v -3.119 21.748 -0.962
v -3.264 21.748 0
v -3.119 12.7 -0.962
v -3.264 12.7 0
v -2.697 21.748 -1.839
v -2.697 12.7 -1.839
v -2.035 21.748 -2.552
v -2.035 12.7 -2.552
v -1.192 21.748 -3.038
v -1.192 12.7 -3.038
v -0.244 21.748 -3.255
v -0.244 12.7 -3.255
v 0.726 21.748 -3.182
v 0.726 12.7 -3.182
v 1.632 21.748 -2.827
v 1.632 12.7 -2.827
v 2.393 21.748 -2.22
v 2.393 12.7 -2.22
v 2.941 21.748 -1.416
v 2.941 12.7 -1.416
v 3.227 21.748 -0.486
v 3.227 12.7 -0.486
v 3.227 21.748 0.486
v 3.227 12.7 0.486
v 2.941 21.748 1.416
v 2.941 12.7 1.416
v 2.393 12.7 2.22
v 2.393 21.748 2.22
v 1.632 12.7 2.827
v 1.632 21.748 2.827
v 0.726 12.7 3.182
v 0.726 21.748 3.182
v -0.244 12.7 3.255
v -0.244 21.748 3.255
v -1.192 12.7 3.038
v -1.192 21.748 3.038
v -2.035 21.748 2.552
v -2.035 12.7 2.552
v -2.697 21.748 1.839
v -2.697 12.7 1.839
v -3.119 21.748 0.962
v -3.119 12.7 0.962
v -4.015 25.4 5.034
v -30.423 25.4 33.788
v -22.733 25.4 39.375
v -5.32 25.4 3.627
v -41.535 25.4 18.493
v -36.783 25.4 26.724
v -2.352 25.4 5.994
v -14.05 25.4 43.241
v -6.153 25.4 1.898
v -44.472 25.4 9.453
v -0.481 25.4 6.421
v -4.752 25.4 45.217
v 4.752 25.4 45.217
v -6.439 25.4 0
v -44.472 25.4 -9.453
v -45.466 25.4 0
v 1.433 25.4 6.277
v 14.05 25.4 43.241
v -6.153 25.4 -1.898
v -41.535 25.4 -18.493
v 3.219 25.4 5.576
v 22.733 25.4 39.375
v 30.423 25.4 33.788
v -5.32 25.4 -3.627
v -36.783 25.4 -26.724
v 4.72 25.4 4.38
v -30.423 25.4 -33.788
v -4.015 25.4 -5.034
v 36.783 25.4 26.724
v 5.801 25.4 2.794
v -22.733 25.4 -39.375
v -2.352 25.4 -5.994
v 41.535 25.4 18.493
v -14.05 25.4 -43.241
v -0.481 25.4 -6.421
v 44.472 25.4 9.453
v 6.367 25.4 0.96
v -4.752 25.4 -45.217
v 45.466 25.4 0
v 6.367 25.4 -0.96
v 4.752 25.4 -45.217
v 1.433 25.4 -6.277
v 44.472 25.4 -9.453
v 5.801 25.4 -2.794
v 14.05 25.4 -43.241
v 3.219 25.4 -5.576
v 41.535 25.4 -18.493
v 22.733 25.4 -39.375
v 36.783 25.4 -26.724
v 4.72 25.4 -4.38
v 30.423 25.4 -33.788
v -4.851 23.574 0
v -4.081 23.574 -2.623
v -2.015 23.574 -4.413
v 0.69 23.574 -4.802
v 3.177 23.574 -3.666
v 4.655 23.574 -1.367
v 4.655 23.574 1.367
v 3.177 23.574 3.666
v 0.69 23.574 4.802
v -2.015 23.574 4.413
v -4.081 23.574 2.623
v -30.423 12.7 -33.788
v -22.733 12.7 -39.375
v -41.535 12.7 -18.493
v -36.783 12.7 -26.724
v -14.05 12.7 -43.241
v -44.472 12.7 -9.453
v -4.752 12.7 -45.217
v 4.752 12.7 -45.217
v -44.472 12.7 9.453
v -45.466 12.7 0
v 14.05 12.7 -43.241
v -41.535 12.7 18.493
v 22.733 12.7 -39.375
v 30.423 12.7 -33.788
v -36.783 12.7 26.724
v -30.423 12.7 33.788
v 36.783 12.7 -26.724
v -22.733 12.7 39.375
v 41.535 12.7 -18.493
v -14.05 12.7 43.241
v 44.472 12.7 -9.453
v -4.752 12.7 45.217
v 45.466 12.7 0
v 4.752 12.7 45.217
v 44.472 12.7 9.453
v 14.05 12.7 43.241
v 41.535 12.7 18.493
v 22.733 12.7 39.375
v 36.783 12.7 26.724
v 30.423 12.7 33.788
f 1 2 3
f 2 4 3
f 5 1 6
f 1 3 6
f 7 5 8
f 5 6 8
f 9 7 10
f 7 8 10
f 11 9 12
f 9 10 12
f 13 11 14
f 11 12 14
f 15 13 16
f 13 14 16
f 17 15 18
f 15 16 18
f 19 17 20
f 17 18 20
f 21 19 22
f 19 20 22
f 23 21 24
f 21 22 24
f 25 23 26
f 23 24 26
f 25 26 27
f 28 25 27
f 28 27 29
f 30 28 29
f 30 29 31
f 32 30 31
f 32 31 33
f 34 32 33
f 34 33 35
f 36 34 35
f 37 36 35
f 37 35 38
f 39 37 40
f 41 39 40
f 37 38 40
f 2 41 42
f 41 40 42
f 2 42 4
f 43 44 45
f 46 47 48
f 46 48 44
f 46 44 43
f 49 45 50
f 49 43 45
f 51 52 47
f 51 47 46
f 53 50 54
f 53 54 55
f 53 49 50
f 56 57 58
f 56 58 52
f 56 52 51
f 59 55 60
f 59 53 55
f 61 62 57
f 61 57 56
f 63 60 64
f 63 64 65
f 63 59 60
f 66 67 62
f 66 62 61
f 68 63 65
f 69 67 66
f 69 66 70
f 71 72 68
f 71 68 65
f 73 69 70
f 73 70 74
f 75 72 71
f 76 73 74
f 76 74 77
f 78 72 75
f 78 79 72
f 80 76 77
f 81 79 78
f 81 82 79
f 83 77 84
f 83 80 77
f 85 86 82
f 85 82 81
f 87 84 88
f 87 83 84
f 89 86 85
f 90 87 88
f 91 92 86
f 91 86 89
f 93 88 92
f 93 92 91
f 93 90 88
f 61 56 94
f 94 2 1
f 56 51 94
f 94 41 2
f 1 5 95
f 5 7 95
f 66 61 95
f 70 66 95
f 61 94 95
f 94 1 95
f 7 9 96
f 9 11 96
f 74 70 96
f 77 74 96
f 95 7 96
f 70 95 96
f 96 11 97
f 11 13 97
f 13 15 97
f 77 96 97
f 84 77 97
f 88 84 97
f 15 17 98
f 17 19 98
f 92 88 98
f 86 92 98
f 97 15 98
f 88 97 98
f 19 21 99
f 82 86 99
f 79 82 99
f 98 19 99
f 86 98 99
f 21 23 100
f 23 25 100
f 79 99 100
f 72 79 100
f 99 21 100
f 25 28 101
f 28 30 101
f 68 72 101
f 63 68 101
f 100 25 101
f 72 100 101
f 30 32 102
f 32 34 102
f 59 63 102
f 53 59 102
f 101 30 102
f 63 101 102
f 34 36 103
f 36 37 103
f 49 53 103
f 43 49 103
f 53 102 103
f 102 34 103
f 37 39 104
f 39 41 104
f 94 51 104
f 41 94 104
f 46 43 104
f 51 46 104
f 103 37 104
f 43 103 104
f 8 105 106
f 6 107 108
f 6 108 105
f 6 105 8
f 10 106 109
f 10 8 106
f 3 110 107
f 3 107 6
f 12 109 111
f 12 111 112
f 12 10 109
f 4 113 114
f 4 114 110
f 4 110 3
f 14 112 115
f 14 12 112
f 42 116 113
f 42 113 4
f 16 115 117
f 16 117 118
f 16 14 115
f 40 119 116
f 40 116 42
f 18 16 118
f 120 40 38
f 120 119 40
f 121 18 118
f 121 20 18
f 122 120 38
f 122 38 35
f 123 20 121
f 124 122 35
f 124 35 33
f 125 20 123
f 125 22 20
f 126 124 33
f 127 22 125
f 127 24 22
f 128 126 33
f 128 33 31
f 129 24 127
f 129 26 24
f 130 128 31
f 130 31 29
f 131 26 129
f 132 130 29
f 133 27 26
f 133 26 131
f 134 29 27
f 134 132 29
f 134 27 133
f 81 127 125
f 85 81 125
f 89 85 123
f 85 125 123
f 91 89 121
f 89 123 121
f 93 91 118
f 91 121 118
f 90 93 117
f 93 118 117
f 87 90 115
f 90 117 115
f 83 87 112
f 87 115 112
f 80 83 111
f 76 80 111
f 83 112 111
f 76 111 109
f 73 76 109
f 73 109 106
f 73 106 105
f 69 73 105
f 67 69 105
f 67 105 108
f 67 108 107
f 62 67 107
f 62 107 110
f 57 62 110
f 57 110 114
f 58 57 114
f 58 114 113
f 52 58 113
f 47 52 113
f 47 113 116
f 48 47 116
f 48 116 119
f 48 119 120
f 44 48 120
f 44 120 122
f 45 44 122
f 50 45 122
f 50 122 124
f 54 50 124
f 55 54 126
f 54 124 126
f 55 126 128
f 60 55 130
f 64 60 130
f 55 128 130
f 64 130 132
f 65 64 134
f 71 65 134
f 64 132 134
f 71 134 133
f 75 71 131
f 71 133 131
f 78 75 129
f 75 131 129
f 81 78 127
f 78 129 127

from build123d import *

# Parameters (mm, degrees)
SKETCH1_R                                        = 45.466
BOSS_EXTRUDE1_DEPTH                              = 25.4
SKETCH3_R                                        = 20.32
CUT_EXTRUDE1_DEPTH                               = 12.7
CSK_FOR_1_4_FLAT_HEAD_MACHINE_SCREW1_D           = 6.5278
CSK_FOR_1_4_FLAT_HEAD_MACHINE_SCREW1_DEPTH       = 25.4
CSK_FOR_1_4_FLAT_HEAD_MACHINE_SCREW1_CSINK_D     = 12.8778
CSK_FOR_1_4_FLAT_HEAD_MACHINE_SCREW1_CSINK_ANGLE = 82
CSK_FOR_1_4_FLAT_HEAD_MACHINE_SCREW1_TIP         = 1.961148974
SKETCH9_R                                        = 53.031918303
CUT_EXTRUDE3_DEPTH                               = 12.7


with BuildPart() as part:
    # Sketch1 → Boss-Extrude1 (new body)
    with BuildSketch(Plane(origin=(0, 0, 0), x_dir=(1, 0, 0), z_dir=(0, 1, 0))):
        Circle(SKETCH1_R)
    extrude(amount=BOSS_EXTRUDE1_DEPTH)

    # Sketch3 → Cut-Extrude1 (cut)
    with BuildSketch(Plane.XZ):
        Circle(SKETCH3_R)
    extrude(amount=-CUT_EXTRUDE1_DEPTH, mode=Mode.SUBTRACT)

    # CSK for 1/4 Flat Head Machine Screw1
    with Locations(Plane(origin=(0, 25.4, 0), x_dir=(1, 0, 0), z_dir=(0, 1, 0))):
        with Locations((0, 0)):
            CounterSinkHole(CSK_FOR_1_4_FLAT_HEAD_MACHINE_SCREW1_D / 2, CSK_FOR_1_4_FLAT_HEAD_MACHINE_SCREW1_CSINK_D / 2, depth=CSK_FOR_1_4_FLAT_HEAD_MACHINE_SCREW1_DEPTH, counter_sink_angle=CSK_FOR_1_4_FLAT_HEAD_MACHINE_SCREW1_CSINK_ANGLE)
            with Locations((0, 0, -(CSK_FOR_1_4_FLAT_HEAD_MACHINE_SCREW1_DEPTH + CSK_FOR_1_4_FLAT_HEAD_MACHINE_SCREW1_TIP / 2))):  # 118° drill point
                Cone(0, CSK_FOR_1_4_FLAT_HEAD_MACHINE_SCREW1_D / 2, CSK_FOR_1_4_FLAT_HEAD_MACHINE_SCREW1_TIP, mode=Mode.SUBTRACT)

    # Sketch9 → Cut-Extrude3 (cut)
    with BuildSketch(Plane.XZ):
        Circle(SKETCH9_R)
    extrude(amount=-CUT_EXTRUDE3_DEPTH, mode=Mode.SUBTRACT)


solid = part.part
